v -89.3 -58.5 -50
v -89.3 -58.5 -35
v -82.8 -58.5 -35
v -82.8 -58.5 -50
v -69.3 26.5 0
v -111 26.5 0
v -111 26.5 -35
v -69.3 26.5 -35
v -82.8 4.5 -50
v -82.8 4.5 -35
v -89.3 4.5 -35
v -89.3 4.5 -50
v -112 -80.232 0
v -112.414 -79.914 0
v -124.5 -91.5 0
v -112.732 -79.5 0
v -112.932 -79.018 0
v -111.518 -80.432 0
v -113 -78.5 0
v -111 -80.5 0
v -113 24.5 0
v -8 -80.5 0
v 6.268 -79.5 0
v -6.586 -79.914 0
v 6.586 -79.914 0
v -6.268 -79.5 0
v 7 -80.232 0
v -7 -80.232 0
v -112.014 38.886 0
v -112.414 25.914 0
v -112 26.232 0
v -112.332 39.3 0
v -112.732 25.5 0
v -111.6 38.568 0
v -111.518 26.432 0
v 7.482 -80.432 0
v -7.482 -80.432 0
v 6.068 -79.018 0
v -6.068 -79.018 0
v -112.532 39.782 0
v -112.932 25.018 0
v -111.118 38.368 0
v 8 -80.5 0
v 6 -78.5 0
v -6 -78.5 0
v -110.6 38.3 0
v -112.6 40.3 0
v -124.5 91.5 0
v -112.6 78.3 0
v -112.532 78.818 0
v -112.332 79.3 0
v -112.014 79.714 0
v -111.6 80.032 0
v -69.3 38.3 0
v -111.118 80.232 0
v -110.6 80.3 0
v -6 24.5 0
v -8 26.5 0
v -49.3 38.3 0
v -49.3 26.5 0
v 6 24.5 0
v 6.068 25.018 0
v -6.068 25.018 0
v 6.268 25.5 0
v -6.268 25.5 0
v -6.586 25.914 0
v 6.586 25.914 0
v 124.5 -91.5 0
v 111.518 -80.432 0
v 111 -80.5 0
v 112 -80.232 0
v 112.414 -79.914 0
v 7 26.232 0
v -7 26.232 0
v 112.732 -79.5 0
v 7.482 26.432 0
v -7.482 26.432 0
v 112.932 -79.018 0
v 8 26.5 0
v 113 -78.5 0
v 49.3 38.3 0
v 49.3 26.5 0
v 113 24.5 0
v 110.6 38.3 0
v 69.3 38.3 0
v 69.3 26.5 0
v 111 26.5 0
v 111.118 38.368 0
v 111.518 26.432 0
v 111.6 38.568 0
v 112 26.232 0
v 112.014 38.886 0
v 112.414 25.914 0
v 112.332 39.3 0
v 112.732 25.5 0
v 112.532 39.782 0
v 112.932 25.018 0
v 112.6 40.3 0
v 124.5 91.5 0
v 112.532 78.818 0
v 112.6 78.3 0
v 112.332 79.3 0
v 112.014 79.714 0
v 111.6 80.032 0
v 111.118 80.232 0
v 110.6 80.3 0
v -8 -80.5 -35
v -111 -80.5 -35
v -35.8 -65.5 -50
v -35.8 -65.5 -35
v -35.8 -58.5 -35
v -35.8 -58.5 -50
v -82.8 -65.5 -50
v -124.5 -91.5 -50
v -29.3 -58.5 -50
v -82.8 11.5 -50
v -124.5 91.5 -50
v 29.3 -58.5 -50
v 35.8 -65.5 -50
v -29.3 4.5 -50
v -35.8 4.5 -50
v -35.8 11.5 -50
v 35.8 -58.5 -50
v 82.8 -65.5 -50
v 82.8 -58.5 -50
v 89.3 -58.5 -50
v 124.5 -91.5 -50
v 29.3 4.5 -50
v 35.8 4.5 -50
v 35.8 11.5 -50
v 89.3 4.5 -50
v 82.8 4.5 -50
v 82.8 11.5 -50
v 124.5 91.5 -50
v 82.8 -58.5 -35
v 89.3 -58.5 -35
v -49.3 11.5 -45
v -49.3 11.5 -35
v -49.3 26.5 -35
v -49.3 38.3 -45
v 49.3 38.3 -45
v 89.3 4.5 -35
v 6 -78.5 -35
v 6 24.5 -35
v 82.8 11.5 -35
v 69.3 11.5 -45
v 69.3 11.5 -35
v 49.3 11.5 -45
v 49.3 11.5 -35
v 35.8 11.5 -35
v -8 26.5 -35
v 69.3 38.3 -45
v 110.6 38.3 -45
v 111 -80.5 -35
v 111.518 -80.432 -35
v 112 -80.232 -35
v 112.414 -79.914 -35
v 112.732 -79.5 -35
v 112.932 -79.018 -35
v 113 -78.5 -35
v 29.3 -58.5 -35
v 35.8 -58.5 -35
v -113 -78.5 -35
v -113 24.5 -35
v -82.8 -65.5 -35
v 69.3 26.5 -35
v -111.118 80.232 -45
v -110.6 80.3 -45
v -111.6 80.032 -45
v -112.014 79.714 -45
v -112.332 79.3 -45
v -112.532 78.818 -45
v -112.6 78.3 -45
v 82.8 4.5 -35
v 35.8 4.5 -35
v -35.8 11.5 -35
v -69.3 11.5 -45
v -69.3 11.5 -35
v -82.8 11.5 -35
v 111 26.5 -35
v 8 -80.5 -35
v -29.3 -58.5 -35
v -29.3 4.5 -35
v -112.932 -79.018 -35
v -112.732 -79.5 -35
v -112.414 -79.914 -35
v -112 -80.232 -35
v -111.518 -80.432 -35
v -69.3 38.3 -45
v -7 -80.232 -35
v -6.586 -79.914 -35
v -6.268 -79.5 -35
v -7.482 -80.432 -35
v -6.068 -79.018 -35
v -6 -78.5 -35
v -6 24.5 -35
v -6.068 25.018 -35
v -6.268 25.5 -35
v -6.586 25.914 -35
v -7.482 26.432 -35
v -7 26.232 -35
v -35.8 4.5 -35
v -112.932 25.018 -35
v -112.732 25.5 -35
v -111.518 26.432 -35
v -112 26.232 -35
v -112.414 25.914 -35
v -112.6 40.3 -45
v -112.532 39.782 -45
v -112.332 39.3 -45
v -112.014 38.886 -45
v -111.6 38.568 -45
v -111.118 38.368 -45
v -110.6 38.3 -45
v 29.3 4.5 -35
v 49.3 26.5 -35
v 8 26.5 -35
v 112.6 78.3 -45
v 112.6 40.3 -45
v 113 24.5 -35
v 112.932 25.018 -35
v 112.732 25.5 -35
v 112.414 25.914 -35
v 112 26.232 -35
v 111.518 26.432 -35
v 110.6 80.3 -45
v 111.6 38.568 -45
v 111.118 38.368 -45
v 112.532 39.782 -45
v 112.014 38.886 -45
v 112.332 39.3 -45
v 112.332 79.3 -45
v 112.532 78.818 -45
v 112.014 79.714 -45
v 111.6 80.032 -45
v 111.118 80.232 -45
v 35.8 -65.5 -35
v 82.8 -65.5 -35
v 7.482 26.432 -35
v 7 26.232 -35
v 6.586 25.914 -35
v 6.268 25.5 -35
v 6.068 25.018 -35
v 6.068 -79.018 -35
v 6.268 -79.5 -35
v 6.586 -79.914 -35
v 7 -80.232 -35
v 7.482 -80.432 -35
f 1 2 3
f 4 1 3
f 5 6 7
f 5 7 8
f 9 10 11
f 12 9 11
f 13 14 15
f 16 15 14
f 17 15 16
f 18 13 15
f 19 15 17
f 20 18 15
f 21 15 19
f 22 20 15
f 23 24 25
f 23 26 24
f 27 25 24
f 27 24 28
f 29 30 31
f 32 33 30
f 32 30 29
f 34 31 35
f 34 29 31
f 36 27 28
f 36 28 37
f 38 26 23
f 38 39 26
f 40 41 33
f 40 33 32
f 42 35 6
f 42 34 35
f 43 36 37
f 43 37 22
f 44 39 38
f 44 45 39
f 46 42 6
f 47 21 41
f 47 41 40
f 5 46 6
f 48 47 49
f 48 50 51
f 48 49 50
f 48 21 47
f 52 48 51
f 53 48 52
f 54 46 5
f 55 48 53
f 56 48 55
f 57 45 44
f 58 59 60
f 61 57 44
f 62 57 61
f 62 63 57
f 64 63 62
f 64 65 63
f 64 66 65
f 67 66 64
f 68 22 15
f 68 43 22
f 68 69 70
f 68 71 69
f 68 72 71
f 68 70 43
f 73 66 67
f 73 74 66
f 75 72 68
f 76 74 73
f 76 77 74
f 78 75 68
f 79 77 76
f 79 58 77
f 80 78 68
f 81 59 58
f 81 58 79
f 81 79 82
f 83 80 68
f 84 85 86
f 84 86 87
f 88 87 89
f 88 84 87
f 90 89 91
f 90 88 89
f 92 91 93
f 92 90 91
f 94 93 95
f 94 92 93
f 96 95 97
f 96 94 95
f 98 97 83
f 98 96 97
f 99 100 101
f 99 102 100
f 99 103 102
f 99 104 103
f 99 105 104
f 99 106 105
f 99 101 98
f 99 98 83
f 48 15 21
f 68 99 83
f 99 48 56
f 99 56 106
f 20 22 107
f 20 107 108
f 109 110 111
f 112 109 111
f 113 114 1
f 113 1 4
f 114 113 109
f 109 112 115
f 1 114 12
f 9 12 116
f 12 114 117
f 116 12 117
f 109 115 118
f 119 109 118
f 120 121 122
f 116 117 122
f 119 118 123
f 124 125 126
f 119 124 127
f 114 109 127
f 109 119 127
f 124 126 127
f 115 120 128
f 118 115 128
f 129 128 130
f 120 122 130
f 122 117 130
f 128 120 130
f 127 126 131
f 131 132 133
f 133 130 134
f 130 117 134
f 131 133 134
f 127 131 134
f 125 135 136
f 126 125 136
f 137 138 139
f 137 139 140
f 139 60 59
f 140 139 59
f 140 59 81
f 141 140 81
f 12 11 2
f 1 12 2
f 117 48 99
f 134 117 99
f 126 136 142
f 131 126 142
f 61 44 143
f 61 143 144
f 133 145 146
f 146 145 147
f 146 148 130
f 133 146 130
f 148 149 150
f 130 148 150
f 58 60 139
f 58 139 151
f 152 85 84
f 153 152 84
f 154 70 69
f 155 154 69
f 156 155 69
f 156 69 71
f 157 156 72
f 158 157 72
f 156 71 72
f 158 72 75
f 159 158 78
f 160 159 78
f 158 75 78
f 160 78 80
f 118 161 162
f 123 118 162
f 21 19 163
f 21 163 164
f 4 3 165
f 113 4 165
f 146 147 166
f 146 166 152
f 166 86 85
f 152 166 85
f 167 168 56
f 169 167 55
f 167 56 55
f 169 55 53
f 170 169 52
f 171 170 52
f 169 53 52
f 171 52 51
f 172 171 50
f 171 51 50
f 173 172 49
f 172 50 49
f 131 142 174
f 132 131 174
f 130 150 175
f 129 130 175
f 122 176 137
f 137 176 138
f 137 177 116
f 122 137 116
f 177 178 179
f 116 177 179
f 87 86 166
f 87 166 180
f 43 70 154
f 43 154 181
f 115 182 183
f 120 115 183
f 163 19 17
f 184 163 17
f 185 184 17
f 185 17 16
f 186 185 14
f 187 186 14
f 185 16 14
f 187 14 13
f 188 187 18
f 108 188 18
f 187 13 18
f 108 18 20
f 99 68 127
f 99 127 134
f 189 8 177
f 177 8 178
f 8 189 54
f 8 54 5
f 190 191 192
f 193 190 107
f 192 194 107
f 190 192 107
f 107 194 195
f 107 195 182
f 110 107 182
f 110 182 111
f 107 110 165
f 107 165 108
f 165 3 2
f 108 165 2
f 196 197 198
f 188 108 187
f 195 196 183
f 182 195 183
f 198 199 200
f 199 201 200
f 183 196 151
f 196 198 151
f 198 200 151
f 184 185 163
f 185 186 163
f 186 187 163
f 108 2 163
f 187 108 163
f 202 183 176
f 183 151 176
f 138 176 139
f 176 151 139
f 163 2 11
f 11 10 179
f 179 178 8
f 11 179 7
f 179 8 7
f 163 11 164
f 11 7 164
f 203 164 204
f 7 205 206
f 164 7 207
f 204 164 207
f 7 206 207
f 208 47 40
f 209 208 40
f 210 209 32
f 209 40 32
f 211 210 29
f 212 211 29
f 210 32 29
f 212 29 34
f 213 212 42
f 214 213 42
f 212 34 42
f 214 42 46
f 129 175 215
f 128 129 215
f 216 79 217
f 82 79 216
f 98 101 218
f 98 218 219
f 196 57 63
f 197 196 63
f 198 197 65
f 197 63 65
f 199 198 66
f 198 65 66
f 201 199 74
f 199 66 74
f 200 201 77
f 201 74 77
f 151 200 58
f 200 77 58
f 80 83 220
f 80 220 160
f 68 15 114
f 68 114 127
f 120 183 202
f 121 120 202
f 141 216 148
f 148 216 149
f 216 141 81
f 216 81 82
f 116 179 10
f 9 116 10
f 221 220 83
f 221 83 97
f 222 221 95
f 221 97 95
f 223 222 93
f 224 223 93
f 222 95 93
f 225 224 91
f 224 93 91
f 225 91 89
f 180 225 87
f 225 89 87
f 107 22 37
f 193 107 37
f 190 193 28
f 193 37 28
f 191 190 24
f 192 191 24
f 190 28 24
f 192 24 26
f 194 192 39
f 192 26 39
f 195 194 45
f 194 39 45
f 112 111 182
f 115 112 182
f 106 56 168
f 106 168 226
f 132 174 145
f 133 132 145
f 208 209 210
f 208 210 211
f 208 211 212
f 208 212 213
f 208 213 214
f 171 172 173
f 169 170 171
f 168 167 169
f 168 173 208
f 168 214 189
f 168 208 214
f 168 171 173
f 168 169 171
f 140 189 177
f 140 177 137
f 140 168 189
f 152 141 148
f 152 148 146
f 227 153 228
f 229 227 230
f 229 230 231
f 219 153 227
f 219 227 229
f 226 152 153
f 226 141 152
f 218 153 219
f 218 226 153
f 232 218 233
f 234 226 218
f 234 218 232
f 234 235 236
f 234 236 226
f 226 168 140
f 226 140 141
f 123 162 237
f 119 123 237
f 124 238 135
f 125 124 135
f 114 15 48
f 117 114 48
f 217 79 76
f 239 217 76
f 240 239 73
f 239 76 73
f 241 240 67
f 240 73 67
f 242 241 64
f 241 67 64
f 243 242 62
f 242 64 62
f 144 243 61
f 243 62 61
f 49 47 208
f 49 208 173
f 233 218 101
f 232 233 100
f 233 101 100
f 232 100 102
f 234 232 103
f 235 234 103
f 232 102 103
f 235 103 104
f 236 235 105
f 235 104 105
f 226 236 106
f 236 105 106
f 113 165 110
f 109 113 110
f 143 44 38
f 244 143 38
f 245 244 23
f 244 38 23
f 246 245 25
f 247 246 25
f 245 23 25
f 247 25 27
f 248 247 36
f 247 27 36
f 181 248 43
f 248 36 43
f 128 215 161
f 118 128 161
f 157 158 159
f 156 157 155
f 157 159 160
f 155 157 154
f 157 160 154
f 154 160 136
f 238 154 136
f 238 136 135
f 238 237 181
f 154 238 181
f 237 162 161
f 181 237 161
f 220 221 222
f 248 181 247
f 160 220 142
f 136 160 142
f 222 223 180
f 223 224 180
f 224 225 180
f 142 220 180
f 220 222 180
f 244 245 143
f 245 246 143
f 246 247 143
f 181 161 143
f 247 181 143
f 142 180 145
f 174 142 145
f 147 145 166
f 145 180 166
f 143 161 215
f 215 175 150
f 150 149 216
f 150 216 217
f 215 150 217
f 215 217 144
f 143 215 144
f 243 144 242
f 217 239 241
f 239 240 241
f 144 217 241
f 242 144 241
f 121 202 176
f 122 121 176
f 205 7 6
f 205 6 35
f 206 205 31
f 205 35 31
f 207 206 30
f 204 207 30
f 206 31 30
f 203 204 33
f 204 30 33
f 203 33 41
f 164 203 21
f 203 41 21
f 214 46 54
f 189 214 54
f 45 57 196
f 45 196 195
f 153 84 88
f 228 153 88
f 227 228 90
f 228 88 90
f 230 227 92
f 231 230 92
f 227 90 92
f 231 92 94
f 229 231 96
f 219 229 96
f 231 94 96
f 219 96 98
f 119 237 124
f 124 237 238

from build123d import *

# Parameters (mm, degrees)
SKETCH_W        = 249
SKETCH_H        = 183
PAD_DEPTH       = 50
POCKET_DEPTH    = 35
POCKET001_DEPTH = 50
POCKET002_DEPTH = 45


with BuildPart() as part:
    # Sketch → Pad (new body)
    with BuildSketch(Plane.XY):
        Rectangle(SKETCH_W, SKETCH_H)
    extrude(amount=-PAD_DEPTH)

    # Sketch001 → Pocket (cut)
    with BuildSketch(Plane.XY):
        with BuildLine():
            Line((-111, 26.5), (-8, 26.5))
            ThreePointArc((-6, 24.5), (-6.585786, 25.914214), (-8, 26.5))
            Line((-6, 24.5), (-6, -78.5))
            ThreePointArc((-8, -80.5), (-6.585786, -79.914214), (-6, -78.5))
            Line((-8, -80.5), (-111, -80.5))
            ThreePointArc((-113, -78.5), (-112.414214, -79.914214), (-111, -80.5))
            Line((-113, -78.5), (-113, 24.5))
            ThreePointArc((-111, 26.5), (-112.414214, 25.914214), (-113, 24.5))
        make_face()
        with BuildLine():
            Line((8, 26.5), (111, 26.5))
            ThreePointArc((113, 24.5), (112.414214, 25.914214), (111, 26.5))
            Line((113, 24.5), (113, -78.5))
            ThreePointArc((111, -80.5), (112.414214, -79.914214), (113, -78.5))
            Line((111, -80.5), (8, -80.5))
            ThreePointArc((6, -78.5), (6.585786, -79.914214), (8, -80.5))
            Line((6, -78.5), (6, 24.5))
            ThreePointArc((8, 26.5), (6.585786, 25.914214), (6, 24.5))
        make_face()
    extrude(amount=-POCKET_DEPTH, mode=Mode.SUBTRACT)

    # Sketch002 → Pocket001 (cut)
    with BuildSketch(Plane.XY):
        Polygon((-82.8, 4.5), (-89.3, 4.5), (-89.3, -58.5), (-82.8, -58.5), (-82.8, -65.5), (-35.8, -65.5), (-35.8, -58.5), (-29.3, -58.5), (-29.3, 4.5), (-35.8, 4.5), (-35.8, 11.5), (-82.8, 11.5), align=None)
        Polygon((35.8, 4.5), (29.3, 4.5), (29.3, -58.5), (35.8, -58.5), (35.8, -65.5), (82.8, -65.5), (82.8, -58.5), (89.3, -58.5), (89.3, 4.5), (82.8, 4.5), (82.8, 11.5), (35.8, 11.5), align=None)
    extrude(amount=-POCKET001_DEPTH, mode=Mode.SUBTRACT)

    # Sketch003 → Pocket002 (cut)
    with BuildSketch(Plane.XY):
        with BuildLine():
            ThreePointArc((-110.6, 80.3), (-112.014214, 79.714214), (-112.6, 78.3))
            Line((-112.6, 40.3), (-112.6, 78.3))
            ThreePointArc((-112.6, 40.3), (-112.014214, 38.885786), (-110.6, 38.3))
            Line((-110.6, 38.3), (-69.3, 38.3))
            Line((-69.3, 38.3), (-69.3, 4.5))
            Line((-69.3, 4.5), (-89.3, 4.5))
            Line((-89.3, 4.5), (-89.3, -58.5))
            Line((-89.3, -58.5), (-82.8, -58.5))
            Line((-82.8, -58.5), (-82.8, -65.5))
            Line((-82.8, -65.5), (-35.8, -65.5))
            Line((-35.8, -65.5), (-35.8, -58.5))
            Line((-35.8, -58.5), (-29.3, -58.5))
            Line((-29.3, -58.5), (-29.3, 4.5))
            Line((-29.3, 4.5), (-49.3, 4.5))
            Line((-49.3, 4.5), (-49.3, 38.3))
            Line((-49.3, 38.3), (49.3, 38.3))
            Line((49.3, 38.3), (49.3, 4.5))
            Line((49.3, 4.5), (29.3, 4.5))
            Line((29.3, 4.5), (29.3, -58.5))
            Line((29.3, -58.5), (35.8, -58.5))
            Line((35.8, -58.5), (35.8, -65.5))
            Line((35.8, -65.5), (82.8, -65.5))
            Line((82.8, -65.5), (82.8, -58.5))
            Line((82.8, -58.5), (89.3, -58.5))
            Line((89.3, -58.5), (89.3, 4.5))
            Line((89.3, 4.5), (69.3, 4.5))
            Line((69.3, 4.5), (69.3, 38.3))
            Line((69.3, 38.3), (110.599996, 38.3))
            ThreePointArc((110.599996, 38.3), (112.01421, 38.885786), (112.599996, 40.3))
            Line((112.599996, 78.3), (112.599996, 40.3))
            ThreePointArc((112.599996, 78.3), (112.01421, 79.714214), (110.599996, 80.3))
            Line((-110.6, 80.3), (110.599996, 80.3))
        make_face()
    extrude(amount=-POCKET002_DEPTH, mode=Mode.SUBTRACT)


solid = part.part
